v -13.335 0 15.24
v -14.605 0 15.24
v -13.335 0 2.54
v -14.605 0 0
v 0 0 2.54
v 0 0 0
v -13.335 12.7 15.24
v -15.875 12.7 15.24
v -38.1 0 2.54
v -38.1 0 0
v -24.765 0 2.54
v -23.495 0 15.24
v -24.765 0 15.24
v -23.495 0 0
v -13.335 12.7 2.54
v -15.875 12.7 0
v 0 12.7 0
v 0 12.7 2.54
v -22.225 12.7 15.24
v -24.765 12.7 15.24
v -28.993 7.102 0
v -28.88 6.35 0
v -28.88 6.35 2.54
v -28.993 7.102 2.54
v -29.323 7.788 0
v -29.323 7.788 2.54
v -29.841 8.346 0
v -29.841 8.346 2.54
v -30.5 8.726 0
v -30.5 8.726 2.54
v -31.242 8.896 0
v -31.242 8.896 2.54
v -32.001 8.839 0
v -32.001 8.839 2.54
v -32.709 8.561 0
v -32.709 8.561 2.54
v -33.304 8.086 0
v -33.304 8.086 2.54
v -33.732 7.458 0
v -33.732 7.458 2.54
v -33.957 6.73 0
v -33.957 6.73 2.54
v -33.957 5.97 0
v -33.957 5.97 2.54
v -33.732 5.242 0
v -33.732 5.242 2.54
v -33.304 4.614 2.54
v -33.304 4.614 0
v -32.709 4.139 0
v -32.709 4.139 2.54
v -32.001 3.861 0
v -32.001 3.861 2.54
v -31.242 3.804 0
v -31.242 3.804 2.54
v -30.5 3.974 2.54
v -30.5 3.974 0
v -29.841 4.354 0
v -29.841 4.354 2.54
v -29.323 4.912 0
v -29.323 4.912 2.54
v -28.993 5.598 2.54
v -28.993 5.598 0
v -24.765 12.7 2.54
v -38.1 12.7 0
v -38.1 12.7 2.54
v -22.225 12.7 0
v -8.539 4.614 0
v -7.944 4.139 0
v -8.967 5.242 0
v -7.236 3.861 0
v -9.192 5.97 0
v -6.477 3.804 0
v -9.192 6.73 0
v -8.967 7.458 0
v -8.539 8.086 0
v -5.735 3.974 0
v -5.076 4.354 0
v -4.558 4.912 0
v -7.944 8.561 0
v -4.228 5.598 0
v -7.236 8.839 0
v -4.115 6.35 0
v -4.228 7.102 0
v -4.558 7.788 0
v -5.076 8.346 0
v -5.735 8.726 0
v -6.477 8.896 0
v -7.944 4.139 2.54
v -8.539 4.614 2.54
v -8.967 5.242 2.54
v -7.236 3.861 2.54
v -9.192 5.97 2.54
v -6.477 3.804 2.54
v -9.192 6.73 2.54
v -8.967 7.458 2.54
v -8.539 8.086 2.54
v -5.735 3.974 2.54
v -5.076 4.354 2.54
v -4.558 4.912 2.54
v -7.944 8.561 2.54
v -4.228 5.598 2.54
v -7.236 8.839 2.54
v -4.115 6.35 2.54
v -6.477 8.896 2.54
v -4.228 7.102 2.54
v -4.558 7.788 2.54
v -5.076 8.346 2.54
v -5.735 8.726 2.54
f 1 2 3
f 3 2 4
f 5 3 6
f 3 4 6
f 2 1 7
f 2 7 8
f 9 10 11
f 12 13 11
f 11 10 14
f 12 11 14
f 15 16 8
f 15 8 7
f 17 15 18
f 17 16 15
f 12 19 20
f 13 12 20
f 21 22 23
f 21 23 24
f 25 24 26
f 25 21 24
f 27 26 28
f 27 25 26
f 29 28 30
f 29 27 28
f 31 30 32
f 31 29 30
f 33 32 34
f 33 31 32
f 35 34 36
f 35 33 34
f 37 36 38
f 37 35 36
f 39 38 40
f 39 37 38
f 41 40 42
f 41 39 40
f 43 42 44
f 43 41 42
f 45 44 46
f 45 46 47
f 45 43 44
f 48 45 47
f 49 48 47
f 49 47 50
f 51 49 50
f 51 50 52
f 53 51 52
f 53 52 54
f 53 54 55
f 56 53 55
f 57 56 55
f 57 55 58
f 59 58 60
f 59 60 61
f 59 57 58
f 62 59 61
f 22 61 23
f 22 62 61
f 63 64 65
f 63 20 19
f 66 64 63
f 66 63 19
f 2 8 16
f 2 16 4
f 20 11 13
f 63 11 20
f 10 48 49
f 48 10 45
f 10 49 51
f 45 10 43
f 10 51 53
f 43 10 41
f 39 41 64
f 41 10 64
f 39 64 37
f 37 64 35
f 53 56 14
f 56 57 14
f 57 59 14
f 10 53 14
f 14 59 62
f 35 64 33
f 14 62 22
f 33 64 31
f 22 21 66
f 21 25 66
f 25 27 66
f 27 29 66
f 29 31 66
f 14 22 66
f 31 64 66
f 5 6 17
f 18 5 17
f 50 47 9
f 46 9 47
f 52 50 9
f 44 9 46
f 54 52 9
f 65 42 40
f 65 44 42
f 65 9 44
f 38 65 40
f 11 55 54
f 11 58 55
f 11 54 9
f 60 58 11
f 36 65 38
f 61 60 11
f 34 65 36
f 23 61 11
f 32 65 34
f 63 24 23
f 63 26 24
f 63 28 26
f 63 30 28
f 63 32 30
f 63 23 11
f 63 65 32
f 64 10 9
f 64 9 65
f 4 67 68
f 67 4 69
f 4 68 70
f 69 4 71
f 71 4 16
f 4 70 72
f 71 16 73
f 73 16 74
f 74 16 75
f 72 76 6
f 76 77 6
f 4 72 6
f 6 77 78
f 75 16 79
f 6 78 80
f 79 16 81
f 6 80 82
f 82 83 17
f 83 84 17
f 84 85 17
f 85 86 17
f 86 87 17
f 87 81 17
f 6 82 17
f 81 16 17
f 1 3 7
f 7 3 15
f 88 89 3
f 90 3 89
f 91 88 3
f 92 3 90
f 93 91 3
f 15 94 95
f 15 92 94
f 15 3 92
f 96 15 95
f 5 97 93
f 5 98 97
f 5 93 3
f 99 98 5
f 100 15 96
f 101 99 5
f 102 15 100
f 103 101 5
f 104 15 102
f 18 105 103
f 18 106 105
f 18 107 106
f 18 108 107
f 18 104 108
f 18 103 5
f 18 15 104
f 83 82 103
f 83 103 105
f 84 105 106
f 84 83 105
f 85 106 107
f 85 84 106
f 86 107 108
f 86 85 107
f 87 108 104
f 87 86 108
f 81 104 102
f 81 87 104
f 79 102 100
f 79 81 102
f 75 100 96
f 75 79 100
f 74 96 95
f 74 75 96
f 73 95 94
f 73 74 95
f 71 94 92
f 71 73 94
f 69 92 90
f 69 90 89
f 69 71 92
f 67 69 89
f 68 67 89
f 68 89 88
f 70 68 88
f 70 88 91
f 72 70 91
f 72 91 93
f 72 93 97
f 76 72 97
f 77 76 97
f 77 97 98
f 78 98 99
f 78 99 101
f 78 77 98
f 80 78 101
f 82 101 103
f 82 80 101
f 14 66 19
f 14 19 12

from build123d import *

# Parameters (mm, degrees)
SKETCH1_W                      = 38.1
SKETCH1_H                      = 12.7
BOSS_EXTRUDE1_DEPTH            = 2.54
SKETCH2_W                      = 2.54
SKETCH2_H                      = 12.7
BOSS_EXTRUDE2_DEPTH            = 12.7
SKETCH3_W                      = 6.35
SKETCH3_H                      = 12.7
CUT_EXTRUDE1_DEPTH             = 43.121134838
CUT_EXTRUDE2_DEPTH             = 43.955297694
F_10_CLEARANCE_HOLE1_OUTLINE_R = 2.5527
F_10_CLEARANCE_HOLE1_DEPTH     = 2.54


# Read off the part's stored shape, not the designer's step: #10 Clearance Hole1
with BuildPart() as part:
    # Sketch1 → Boss-Extrude1 (new body)
    with BuildSketch(Plane.XY):
        with Locations((-19.05, 6.35)):
            Rectangle(SKETCH1_W, SKETCH1_H)
    extrude(amount=BOSS_EXTRUDE1_DEPTH)

    # Sketch2 → Boss-Extrude2 (add)
    with BuildSketch(Plane(origin=(-38.1, 12.7, 2.54), x_dir=(-1, 0, 0), z_dir=(0, 0, -1))):
        with Locations((-14.605, -6.35)):
            Rectangle(SKETCH2_W, SKETCH2_H)
        with Locations((-23.495, -6.35)):
            Rectangle(SKETCH2_W, SKETCH2_H)
    extrude(amount=-BOSS_EXTRUDE2_DEPTH)

    # Sketch3 → Cut-Extrude1 (cut, through all)
    with BuildSketch(Plane.XY.offset(2.54)):
        with Locations((-19.05, 6.35)):
            Rectangle(SKETCH3_W, SKETCH3_H)
    extrude(amount=-CUT_EXTRUDE1_DEPTH, mode=Mode.SUBTRACT)


with BuildPart() as cut_extrude1_piece_1:
    # of the separate pieces the step leaves, piece 1, a body of its own (cut_extrude1_pieces)
    add(part.part.solids().sort_by_distance((-22.225, 0, 0))[0])


with BuildPart() as cut_extrude1_piece_2:
    # of the separate pieces the step leaves, piece 2, a body of its own (cut_extrude1_pieces)
    add(part.part.solids().sort_by_distance((0, 0, 0))[0])


with BuildPart() as cut_extrude2_tool:
    # Sketch4 → Cut-Extrude2 (new, through all)
    with BuildSketch(Plane.XY.offset(15.24)):
        Polygon((-22.225, 12.7), (-23.495, 0), (-22.225, 0), align=None)
        Polygon((-15.875, 12.7), (-14.605, 0), (-15.875, 0), align=None)
    extrude(amount=-CUT_EXTRUDE2_DEPTH)


with BuildPart() as cut_extrude1_piece_1_1:
    add(cut_extrude1_piece_1.part)

    # Cut-Extrude2: cut by cut_extrude2_tool
    add(cut_extrude2_tool.part, mode=Mode.SUBTRACT)


with BuildPart() as cut_extrude1_piece_2_1:
    add(cut_extrude1_piece_2.part)

    # Cut-Extrude2: cut by cut_extrude2_tool
    add(cut_extrude2_tool.part, mode=Mode.SUBTRACT)


with BuildPart() as f_10_clearance_hole1_tool:
    # #10 Clearance Hole1 outline → #10 Clearance Hole1 (new body)
    with BuildSketch(Plane.XY):
        with Locations((-31.4325, 6.35)):
            Circle(F_10_CLEARANCE_HOLE1_OUTLINE_R)
        with Locations((-6.6675, 6.35)):
            Circle(F_10_CLEARANCE_HOLE1_OUTLINE_R)
    extrude(amount=F_10_CLEARANCE_HOLE1_DEPTH)


with BuildPart() as cut_extrude1_piece_1_2:
    add(cut_extrude1_piece_1_1.part)

    # #10 Clearance Hole1: cut by f_10_clearance_hole1_tool
    add(f_10_clearance_hole1_tool.part, mode=Mode.SUBTRACT)


with BuildPart() as cut_extrude1_piece_2_2:
    add(cut_extrude1_piece_2_1.part)

    # #10 Clearance Hole1: cut by f_10_clearance_hole1_tool
    add(f_10_clearance_hole1_tool.part, mode=Mode.SUBTRACT)


solid = Compound([cut_extrude1_piece_1_2.part, cut_extrude1_piece_2_2.part])
